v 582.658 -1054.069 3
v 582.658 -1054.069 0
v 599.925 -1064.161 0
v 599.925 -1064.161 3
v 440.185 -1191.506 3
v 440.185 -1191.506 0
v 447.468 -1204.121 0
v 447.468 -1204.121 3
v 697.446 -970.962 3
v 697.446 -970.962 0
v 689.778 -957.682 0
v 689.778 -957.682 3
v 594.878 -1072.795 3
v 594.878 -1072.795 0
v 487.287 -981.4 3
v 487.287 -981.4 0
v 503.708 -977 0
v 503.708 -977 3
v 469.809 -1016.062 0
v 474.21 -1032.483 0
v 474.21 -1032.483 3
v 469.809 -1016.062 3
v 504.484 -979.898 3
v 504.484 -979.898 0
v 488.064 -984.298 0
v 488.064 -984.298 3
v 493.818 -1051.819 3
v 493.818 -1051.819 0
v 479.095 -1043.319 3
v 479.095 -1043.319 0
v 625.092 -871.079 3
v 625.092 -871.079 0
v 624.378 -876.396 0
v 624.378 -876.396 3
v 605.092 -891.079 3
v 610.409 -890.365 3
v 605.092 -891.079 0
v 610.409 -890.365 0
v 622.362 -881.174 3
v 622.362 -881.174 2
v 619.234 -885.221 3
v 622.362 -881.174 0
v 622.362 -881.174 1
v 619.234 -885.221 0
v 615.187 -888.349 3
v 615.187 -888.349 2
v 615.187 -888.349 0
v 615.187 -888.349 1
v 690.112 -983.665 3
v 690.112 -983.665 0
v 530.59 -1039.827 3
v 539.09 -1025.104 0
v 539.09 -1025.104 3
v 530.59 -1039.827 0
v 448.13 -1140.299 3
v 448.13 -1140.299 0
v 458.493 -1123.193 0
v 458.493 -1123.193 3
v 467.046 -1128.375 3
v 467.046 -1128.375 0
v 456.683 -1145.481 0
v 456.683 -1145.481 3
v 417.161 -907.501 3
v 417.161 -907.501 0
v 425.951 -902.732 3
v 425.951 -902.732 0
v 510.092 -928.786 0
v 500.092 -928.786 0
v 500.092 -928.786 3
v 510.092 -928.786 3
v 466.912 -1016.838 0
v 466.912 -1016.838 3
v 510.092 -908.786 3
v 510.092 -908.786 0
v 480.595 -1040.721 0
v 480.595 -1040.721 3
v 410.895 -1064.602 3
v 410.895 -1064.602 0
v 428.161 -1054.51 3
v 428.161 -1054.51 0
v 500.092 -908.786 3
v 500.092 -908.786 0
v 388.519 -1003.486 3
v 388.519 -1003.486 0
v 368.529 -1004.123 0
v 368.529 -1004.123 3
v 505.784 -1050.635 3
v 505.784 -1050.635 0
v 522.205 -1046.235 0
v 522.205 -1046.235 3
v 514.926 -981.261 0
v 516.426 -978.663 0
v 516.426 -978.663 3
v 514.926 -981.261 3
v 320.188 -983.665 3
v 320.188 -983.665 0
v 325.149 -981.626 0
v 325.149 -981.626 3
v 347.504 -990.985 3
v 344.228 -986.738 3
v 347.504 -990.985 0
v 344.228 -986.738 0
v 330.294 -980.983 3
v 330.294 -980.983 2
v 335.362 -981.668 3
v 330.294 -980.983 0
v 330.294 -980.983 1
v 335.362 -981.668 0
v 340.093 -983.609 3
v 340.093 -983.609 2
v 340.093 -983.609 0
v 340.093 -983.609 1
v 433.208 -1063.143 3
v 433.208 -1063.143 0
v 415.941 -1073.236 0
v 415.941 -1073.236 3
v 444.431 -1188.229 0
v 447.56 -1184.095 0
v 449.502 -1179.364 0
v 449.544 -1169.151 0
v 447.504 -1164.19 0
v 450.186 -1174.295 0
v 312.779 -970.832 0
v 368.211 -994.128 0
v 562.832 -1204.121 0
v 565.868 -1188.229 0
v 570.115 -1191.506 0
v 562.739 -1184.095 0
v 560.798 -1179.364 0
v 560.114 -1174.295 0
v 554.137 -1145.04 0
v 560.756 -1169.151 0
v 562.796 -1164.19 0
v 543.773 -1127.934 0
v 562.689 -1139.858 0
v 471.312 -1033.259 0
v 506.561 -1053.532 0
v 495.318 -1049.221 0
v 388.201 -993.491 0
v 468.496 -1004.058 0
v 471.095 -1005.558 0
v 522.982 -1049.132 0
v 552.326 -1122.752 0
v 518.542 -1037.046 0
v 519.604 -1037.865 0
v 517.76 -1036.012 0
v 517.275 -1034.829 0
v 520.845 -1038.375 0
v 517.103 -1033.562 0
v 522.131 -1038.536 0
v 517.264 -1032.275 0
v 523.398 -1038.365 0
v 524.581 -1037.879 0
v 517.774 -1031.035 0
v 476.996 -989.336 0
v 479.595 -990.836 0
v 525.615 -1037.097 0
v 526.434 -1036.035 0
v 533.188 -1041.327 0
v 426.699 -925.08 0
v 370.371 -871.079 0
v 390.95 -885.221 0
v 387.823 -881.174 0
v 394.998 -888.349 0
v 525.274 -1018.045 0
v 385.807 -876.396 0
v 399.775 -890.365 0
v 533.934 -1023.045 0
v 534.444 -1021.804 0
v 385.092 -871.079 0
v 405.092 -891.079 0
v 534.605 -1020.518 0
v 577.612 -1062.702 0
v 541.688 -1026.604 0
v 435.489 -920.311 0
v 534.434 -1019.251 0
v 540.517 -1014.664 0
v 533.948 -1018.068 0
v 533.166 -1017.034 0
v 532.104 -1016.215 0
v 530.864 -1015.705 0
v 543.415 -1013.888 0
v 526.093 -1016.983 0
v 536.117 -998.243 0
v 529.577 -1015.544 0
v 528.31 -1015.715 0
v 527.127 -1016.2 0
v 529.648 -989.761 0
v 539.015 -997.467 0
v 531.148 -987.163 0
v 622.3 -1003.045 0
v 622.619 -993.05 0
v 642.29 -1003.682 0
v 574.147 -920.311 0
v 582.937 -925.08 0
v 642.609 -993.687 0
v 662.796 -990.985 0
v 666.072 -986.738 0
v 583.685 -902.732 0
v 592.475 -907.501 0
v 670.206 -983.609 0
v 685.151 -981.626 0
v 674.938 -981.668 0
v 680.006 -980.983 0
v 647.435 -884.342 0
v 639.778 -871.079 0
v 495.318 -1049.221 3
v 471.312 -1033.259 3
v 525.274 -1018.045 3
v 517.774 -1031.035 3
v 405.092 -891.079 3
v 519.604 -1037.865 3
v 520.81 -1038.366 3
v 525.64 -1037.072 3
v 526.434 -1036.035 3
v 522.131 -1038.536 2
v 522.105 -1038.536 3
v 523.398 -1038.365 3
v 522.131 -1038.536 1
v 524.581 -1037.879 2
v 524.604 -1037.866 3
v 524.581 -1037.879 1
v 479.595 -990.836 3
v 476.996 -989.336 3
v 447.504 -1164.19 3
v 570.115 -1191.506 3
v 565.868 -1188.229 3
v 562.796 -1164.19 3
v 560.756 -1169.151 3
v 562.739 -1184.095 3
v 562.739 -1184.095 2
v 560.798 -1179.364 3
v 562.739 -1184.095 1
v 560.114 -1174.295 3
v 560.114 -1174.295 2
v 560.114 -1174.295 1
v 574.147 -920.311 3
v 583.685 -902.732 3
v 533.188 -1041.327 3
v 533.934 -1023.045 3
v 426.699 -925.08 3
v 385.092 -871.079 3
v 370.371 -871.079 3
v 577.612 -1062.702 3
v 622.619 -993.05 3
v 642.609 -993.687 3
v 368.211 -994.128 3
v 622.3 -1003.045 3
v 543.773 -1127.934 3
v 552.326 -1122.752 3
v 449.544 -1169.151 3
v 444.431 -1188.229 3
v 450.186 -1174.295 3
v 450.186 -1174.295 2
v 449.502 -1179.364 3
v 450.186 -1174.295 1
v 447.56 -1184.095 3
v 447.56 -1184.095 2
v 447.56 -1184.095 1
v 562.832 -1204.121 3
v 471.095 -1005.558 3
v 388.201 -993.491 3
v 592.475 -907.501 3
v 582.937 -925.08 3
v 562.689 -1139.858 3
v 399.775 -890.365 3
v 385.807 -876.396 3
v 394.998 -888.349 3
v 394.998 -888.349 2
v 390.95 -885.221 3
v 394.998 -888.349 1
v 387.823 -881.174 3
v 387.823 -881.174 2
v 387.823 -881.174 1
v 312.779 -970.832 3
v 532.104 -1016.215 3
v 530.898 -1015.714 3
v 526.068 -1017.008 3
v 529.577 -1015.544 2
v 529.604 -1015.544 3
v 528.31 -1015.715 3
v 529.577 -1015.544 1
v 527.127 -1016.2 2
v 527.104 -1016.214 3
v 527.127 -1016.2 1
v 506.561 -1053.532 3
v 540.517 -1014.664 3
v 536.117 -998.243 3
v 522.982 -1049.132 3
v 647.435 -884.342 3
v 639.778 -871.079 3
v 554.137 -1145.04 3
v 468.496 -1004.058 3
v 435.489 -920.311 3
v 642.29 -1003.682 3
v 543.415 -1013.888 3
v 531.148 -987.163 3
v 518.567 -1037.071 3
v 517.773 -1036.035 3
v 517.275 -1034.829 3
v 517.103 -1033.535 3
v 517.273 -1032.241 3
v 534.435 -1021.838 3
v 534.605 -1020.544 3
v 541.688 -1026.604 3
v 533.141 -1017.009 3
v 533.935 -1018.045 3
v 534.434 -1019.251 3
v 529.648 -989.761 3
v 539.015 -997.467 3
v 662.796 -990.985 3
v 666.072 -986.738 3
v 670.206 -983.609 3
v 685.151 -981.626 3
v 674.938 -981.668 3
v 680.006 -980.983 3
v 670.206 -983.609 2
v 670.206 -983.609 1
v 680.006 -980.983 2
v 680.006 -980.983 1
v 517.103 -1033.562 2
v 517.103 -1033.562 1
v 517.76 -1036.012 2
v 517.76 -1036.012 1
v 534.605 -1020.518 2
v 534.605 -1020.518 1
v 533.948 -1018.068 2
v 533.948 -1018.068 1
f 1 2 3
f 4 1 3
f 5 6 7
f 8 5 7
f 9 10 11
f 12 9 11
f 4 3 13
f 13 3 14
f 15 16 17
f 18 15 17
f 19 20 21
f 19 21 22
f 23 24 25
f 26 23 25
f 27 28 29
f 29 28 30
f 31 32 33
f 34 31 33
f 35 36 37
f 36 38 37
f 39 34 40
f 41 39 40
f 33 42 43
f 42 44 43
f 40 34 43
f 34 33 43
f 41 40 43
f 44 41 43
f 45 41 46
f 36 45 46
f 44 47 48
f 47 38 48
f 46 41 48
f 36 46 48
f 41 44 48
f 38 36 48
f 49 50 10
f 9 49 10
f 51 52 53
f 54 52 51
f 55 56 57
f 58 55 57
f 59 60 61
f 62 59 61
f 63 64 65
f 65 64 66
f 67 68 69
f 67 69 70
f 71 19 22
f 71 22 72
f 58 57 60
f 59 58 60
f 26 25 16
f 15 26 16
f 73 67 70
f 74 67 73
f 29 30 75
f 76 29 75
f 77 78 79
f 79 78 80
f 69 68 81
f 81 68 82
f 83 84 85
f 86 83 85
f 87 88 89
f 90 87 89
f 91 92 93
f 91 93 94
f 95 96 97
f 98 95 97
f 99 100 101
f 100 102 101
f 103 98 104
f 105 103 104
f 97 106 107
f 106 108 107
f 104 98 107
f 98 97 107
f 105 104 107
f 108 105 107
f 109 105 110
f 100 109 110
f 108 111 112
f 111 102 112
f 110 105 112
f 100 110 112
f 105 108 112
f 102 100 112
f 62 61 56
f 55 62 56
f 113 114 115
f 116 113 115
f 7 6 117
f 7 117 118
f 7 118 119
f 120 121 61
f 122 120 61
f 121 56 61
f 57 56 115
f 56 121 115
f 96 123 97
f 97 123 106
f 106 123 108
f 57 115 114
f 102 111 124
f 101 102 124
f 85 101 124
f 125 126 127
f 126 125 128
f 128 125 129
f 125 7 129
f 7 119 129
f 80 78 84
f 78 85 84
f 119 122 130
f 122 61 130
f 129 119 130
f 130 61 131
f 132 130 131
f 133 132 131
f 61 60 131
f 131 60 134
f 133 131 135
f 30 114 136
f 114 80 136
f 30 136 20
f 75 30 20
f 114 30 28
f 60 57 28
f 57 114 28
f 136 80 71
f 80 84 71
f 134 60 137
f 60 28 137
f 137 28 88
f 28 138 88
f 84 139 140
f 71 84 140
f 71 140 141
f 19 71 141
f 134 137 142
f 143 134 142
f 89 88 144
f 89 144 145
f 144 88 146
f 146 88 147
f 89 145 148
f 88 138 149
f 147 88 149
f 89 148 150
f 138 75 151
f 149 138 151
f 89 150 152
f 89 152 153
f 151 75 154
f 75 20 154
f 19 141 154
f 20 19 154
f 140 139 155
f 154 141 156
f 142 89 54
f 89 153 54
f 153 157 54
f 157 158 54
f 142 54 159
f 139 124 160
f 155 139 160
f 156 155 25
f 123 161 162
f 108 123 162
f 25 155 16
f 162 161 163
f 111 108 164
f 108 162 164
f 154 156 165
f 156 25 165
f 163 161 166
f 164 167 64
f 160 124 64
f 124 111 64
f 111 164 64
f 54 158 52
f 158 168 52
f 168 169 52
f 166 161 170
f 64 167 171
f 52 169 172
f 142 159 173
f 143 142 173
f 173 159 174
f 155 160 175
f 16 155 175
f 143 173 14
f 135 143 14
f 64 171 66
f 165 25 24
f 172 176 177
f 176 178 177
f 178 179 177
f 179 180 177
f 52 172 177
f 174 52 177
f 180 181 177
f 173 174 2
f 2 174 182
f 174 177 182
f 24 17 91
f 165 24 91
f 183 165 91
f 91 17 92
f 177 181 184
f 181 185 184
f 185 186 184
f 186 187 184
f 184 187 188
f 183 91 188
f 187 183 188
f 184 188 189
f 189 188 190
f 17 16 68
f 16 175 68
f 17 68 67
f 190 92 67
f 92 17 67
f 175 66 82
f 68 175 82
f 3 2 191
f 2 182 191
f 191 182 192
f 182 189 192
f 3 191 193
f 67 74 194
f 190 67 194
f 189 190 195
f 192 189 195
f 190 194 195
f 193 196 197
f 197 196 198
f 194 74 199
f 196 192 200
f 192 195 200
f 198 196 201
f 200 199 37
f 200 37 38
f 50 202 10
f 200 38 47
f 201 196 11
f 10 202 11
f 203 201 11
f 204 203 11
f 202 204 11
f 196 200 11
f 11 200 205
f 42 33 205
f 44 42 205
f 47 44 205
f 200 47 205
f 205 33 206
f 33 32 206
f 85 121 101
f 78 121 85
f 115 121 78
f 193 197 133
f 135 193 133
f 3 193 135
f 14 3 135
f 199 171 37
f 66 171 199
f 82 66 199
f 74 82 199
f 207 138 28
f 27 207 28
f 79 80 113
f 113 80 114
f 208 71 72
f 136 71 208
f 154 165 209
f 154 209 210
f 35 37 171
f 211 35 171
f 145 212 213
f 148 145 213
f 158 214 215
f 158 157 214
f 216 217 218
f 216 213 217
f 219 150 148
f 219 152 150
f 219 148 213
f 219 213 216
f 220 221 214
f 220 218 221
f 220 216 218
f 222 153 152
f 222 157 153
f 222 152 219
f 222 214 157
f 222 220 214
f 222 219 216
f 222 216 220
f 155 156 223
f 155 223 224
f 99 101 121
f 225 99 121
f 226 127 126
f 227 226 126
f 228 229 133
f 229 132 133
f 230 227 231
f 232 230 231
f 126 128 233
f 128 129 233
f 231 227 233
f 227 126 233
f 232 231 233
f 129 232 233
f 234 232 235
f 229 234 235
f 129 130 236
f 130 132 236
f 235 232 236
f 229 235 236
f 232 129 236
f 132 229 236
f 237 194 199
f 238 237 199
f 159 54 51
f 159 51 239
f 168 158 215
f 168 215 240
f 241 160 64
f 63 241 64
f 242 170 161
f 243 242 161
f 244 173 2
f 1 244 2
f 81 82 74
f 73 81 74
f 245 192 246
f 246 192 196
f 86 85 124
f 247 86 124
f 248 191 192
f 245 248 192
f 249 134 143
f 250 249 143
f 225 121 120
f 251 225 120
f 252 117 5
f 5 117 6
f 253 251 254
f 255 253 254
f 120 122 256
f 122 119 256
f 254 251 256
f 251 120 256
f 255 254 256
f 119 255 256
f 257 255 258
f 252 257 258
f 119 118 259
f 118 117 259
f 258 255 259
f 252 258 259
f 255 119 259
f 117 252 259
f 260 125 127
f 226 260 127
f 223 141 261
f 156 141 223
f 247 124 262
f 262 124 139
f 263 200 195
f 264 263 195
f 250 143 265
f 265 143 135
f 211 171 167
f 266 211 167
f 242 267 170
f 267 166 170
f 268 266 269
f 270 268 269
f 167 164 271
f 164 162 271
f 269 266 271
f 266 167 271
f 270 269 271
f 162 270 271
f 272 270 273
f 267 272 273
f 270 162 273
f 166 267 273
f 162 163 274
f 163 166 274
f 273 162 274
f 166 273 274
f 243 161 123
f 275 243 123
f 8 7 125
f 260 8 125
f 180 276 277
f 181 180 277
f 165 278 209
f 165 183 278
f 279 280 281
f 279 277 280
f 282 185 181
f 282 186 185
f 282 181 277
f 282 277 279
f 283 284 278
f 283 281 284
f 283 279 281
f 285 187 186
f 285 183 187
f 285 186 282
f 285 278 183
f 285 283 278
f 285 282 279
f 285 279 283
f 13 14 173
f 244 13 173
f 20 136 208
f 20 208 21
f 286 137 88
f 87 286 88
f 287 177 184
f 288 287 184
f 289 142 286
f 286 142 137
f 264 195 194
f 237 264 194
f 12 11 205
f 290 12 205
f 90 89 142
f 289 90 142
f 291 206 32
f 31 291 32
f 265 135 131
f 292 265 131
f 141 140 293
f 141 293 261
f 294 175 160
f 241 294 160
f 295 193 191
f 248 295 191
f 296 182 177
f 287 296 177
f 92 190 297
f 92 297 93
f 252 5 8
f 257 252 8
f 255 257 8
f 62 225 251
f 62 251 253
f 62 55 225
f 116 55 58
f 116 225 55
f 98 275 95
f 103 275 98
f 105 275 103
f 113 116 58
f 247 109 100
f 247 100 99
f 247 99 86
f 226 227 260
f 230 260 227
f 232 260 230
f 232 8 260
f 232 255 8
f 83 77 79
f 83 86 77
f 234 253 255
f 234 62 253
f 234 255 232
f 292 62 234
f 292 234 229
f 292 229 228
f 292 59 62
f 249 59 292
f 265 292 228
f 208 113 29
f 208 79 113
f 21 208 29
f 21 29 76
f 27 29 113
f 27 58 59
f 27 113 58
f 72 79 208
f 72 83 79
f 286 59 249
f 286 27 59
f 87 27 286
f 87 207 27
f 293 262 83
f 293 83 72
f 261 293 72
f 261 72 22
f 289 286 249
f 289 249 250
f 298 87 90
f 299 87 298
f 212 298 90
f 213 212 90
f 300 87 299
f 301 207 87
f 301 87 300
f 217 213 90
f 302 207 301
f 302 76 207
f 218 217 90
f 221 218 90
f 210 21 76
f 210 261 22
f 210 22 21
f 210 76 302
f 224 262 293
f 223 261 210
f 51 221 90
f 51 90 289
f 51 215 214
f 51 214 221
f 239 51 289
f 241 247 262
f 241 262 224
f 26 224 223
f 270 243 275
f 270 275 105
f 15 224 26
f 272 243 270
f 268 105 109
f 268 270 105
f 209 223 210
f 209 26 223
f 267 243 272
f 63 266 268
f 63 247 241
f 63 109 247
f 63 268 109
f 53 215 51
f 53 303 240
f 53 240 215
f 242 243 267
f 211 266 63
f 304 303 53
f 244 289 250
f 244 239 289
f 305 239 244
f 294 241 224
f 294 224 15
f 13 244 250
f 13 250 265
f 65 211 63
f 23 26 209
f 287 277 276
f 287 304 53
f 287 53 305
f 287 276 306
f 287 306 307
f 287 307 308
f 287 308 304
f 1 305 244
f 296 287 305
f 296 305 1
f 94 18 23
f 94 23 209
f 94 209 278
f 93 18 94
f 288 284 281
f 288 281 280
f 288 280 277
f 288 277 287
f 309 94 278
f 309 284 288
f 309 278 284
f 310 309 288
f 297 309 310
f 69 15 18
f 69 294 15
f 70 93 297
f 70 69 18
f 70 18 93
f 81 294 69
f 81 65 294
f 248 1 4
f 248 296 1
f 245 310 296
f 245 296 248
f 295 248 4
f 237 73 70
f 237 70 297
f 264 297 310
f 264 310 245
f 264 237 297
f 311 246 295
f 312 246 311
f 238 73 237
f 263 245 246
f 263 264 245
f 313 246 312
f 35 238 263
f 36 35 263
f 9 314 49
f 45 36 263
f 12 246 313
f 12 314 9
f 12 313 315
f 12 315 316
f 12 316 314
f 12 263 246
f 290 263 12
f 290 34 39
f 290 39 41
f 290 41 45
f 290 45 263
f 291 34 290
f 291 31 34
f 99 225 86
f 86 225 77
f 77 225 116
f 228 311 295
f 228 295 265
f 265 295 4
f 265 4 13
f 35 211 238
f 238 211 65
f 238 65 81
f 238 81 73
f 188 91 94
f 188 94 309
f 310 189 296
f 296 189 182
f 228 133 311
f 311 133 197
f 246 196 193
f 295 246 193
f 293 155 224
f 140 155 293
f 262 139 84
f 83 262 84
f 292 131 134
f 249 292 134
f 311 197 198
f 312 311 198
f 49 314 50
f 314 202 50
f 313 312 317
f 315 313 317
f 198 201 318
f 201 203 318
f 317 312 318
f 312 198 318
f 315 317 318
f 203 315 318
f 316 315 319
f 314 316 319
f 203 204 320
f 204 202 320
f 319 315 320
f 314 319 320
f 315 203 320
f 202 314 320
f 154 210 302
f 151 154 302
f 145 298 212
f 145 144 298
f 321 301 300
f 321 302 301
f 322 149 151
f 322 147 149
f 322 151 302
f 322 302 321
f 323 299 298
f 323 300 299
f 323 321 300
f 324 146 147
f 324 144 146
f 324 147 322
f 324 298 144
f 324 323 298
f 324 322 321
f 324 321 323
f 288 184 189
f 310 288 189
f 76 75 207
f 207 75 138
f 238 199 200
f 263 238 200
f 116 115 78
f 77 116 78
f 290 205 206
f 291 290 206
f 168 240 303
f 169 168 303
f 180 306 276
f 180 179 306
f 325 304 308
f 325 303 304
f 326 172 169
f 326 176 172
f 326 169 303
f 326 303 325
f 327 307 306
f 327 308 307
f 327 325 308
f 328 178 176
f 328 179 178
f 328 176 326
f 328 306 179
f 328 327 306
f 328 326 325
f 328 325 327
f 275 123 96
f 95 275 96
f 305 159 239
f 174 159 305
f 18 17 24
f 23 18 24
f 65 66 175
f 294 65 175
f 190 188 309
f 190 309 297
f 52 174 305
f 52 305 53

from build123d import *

# Parameters (mm, degrees)
MODEL_W                 = 10.000078668
MODEL_H                 = 19.99998508
BOSS_EXTRU_1_DEPTH      = 3
ENL_V_MAT_EXTRU_2_DEPTH = 1392.526576556


with BuildPart() as part:
    # Model → Boss.-Extru.1 (new body)
    with BuildSketch(Plane.XY):
        with BuildLine():
            Line((347.504229039, -990.984743501), (447.504154456, -1164.189847387))
            add(Edge.make_bspline(
                [(447.504154456, -1164.189847387), (453.026125757, -1173.754121475), (449.749150931, -1185.983779814), (440.184876843, -1191.505837242)],
                knots=[1, 1, 1, 1, 2, 2, 2, 2], degree=3))
            Line((440.184876843, -1191.505837242), (447.468153212, -1204.120743383))
            Line((447.468153212, -1204.120743383), (462.904937066, -1204.120743383))
            Line((462.904937066, -1204.120743383), (547.394870334, -1204.120743383))
            Line((547.394870334, -1204.120743383), (562.831654188, -1204.120743383))
            Line((562.831654188, -1204.120743383), (570.114930554, -1191.505837241))
            add(Edge.make_bspline(
                [(570.114930554, -1191.505837241), (560.550656465, -1185.983779815), (557.273681638, -1173.754121476), (562.795652937, -1164.189847387)],
                knots=[7, 7, 7, 7, 8, 8, 8, 8], degree=3))
            Line((562.795652937, -1164.189847387), (662.795578323, -990.984743483))
            add(Edge.make_bspline(
                [(662.795578323, -990.984743483), (668.317549622, -981.420469394), (680.547294088, -978.143580694), (690.111568177, -983.665465865)],
                knots=[9, 9, 9, 9, 10, 10, 10, 10], degree=3))
            Line((690.111568177, -983.665465865), (697.445659701, -970.962451406))
            Line((697.445659701, -970.962451406), (689.778082931, -957.6818667))
            Line((689.778082931, -957.6818667), (647.435103324, -884.341812722))
            Line((647.435103324, -884.341812722), (639.77820635, -871.079314757))
            Line((639.77820635, -871.079314757), (625.092281057, -871.079314757))
            add(Edge.make_bspline(
                [(625.092281057, -871.079314757), (625.092281058, -882.124979905), (616.137961126, -891.079299838), (605.092295979, -891.079299839)],
                knots=[17, 17, 17, 17, 18, 18, 18, 18], degree=3))
            Line((605.092295979, -891.079299839), (405.092272921, -891.079299839))
            add(Edge.make_bspline(
                [(405.092272921, -891.079299839), (394.046607773, -891.07929984), (385.09228784, -882.124979908), (385.092287839, -871.079314761)],
                knots=[19, 19, 19, 19, 20, 20, 20, 20], degree=3))
            Line((385.092287839, -871.079314761), (370.370533553, -871.079314761))
            Line((370.370533553, -871.079314761), (312.778700066, -970.831623929))
            Line((312.778700066, -970.831623929), (320.188239184, -983.665465888))
            add(Edge.make_bspline(
                [(320.188239184, -983.665465888), (329.752513272, -978.143494587), (341.982257738, -981.420469413), (347.504229039, -990.984743501)],
                knots=[23, 23, 23, 23, 24, 24, 24, 24], degree=3))
        make_face()
        Polygon((622.618702509, -993.05007822), (642.608524558, -993.687248628), (642.290025481, -1003.682159653), (622.300031178, -1003.044989244), align=None, mode=Mode.SUBTRACT)
        Polygon((594.878104643, -1072.794736968), (577.611630575, -1062.701812979), (582.658178697, -1054.068575945), (599.924652765, -1064.161499934), align=None, mode=Mode.SUBTRACT)
        Polygon((583.685161648, -902.731560157), (592.474806017, -907.50051971), (582.937059165, -925.079722321), (574.147414796, -920.310848895), align=None, mode=Mode.SUBTRACT)
        Polygon((552.326007751, -1122.752411126), (562.689371739, -1139.857999232), (554.136577686, -1145.039681226), (543.773213697, -1127.93409312), align=None, mode=Mode.SUBTRACT)
        with Locations((505.092198326, -918.785791257)):
            Rectangle(MODEL_W, MODEL_H, mode=Mode.SUBTRACT)
        Polygon((458.493147779, -1123.193383356), (467.045941833, -1128.375065349), (456.682577848, -1145.480653457), (448.129783794, -1140.298971465), align=None, mode=Mode.SUBTRACT)
        Polygon((425.950948052, -902.731560171), (435.488694907, -920.310848907), (426.699050539, -925.079722335), (417.161303684, -907.500519726), align=None, mode=Mode.SUBTRACT)
        Polygon((428.161149075, -1054.509548181), (433.207697199, -1063.142785214), (415.941223133, -1073.235709206), (410.894675009, -1064.602472173), align=None, mode=Mode.SUBTRACT)
        Polygon((388.200625252, -993.491050463), (388.519124331, -1003.485961487), (368.529302282, -1004.123131899), (368.210803204, -994.128220875), align=None, mode=Mode.SUBTRACT)
    extrude(amount=BOSS_EXTRU_1_DEPTH)

    # Esquisse2 → Enlèv. mat.-Extru.2 (cut, through all)
    with BuildSketch(Plane(origin=(0, 0, 0), x_dir=(-1, 0, 0), z_dir=(0, 0, -1))):
        with BuildLine():
            Line((-526.434334105, -1036.035042627), (-533.934329365, -1023.044658352))
            add(Edge.make_bspline(
                [(-533.934329365, -1023.044658352), (-535.315042909, -1020.653190239), (-534.495664502, -1017.595243477), (-532.104199693, -1016.21453184)],
                knots=[1, 1, 1, 1, 2, 2, 2, 2], degree=3))
            add(Edge.make_bspline(
                [(-532.104199693, -1016.21453184), (-529.712734884, -1014.833820204), (-526.654786726, -1015.653193399), (-525.274073182, -1018.044661512)],
                knots=[2, 2, 2, 2, 3, 3, 3, 3], degree=3))
            Line((-525.274073182, -1018.044661512), (-517.774077922, -1031.035045787))
            add(Edge.make_bspline(
                [(-517.774077922, -1031.035045787), (-516.393364378, -1033.4265139), (-517.212742785, -1036.484460663), (-519.604207594, -1037.865172299)],
                knots=[4, 4, 4, 4, 5, 5, 5, 5], degree=3))
            add(Edge.make_bspline(
                [(-519.604207594, -1037.865172299), (-521.995672403, -1039.245883936), (-525.053620562, -1038.42651074), (-526.434334105, -1036.035042627)],
                knots=[5, 5, 5, 5, 6, 6, 6, 6], degree=3))
        make_face()
        Polygon((-466.912163294, -1016.838076711), (-471.311987833, -1033.258962352), (-474.209588183, -1032.482769314), (-469.809499355, -1016.061731085), align=None)
        Polygon((-505.784176347, -1050.63498378), (-522.204989382, -1046.234888271), (-522.981588875, -1049.132379712), (-506.560775841, -1053.532475221), align=None)
        Polygon((-543.414554373, -1013.888013101), (-540.516954023, -1014.664206139), (-536.117129484, -998.243320497), (-539.014729835, -997.467127459), align=None)
        Polygon((-487.287063031, -981.399673764), (-503.708140356, -976.999730842), (-504.48424394, -979.898081226), (-488.064270392, -984.297516156), align=None)
        Polygon((-539.08988115, -1025.104375563), (-530.589886522, -1039.826811075), (-533.187963377, -1041.326810127), (-541.687958005, -1026.604374615), align=None)
        Polygon((-516.425728308, -978.663411899), (-514.925729256, -981.261488754), (-529.648164768, -989.761483382), (-531.14816382, -987.163406527), align=None)
        Polygon((-479.095212457, -1043.319423279), (-480.595215323, -1040.721339817), (-495.317650835, -1049.221334445), (-493.817647969, -1051.819417907), align=None)
        Polygon((-476.996433275, -989.335575737), (-468.496438647, -1004.058011249), (-471.094515502, -1005.558010301), (-479.59451013, -990.835574789), align=None)
    extrude(amount=-ENL_V_MAT_EXTRU_2_DEPTH, mode=Mode.SUBTRACT)


solid = part.part
